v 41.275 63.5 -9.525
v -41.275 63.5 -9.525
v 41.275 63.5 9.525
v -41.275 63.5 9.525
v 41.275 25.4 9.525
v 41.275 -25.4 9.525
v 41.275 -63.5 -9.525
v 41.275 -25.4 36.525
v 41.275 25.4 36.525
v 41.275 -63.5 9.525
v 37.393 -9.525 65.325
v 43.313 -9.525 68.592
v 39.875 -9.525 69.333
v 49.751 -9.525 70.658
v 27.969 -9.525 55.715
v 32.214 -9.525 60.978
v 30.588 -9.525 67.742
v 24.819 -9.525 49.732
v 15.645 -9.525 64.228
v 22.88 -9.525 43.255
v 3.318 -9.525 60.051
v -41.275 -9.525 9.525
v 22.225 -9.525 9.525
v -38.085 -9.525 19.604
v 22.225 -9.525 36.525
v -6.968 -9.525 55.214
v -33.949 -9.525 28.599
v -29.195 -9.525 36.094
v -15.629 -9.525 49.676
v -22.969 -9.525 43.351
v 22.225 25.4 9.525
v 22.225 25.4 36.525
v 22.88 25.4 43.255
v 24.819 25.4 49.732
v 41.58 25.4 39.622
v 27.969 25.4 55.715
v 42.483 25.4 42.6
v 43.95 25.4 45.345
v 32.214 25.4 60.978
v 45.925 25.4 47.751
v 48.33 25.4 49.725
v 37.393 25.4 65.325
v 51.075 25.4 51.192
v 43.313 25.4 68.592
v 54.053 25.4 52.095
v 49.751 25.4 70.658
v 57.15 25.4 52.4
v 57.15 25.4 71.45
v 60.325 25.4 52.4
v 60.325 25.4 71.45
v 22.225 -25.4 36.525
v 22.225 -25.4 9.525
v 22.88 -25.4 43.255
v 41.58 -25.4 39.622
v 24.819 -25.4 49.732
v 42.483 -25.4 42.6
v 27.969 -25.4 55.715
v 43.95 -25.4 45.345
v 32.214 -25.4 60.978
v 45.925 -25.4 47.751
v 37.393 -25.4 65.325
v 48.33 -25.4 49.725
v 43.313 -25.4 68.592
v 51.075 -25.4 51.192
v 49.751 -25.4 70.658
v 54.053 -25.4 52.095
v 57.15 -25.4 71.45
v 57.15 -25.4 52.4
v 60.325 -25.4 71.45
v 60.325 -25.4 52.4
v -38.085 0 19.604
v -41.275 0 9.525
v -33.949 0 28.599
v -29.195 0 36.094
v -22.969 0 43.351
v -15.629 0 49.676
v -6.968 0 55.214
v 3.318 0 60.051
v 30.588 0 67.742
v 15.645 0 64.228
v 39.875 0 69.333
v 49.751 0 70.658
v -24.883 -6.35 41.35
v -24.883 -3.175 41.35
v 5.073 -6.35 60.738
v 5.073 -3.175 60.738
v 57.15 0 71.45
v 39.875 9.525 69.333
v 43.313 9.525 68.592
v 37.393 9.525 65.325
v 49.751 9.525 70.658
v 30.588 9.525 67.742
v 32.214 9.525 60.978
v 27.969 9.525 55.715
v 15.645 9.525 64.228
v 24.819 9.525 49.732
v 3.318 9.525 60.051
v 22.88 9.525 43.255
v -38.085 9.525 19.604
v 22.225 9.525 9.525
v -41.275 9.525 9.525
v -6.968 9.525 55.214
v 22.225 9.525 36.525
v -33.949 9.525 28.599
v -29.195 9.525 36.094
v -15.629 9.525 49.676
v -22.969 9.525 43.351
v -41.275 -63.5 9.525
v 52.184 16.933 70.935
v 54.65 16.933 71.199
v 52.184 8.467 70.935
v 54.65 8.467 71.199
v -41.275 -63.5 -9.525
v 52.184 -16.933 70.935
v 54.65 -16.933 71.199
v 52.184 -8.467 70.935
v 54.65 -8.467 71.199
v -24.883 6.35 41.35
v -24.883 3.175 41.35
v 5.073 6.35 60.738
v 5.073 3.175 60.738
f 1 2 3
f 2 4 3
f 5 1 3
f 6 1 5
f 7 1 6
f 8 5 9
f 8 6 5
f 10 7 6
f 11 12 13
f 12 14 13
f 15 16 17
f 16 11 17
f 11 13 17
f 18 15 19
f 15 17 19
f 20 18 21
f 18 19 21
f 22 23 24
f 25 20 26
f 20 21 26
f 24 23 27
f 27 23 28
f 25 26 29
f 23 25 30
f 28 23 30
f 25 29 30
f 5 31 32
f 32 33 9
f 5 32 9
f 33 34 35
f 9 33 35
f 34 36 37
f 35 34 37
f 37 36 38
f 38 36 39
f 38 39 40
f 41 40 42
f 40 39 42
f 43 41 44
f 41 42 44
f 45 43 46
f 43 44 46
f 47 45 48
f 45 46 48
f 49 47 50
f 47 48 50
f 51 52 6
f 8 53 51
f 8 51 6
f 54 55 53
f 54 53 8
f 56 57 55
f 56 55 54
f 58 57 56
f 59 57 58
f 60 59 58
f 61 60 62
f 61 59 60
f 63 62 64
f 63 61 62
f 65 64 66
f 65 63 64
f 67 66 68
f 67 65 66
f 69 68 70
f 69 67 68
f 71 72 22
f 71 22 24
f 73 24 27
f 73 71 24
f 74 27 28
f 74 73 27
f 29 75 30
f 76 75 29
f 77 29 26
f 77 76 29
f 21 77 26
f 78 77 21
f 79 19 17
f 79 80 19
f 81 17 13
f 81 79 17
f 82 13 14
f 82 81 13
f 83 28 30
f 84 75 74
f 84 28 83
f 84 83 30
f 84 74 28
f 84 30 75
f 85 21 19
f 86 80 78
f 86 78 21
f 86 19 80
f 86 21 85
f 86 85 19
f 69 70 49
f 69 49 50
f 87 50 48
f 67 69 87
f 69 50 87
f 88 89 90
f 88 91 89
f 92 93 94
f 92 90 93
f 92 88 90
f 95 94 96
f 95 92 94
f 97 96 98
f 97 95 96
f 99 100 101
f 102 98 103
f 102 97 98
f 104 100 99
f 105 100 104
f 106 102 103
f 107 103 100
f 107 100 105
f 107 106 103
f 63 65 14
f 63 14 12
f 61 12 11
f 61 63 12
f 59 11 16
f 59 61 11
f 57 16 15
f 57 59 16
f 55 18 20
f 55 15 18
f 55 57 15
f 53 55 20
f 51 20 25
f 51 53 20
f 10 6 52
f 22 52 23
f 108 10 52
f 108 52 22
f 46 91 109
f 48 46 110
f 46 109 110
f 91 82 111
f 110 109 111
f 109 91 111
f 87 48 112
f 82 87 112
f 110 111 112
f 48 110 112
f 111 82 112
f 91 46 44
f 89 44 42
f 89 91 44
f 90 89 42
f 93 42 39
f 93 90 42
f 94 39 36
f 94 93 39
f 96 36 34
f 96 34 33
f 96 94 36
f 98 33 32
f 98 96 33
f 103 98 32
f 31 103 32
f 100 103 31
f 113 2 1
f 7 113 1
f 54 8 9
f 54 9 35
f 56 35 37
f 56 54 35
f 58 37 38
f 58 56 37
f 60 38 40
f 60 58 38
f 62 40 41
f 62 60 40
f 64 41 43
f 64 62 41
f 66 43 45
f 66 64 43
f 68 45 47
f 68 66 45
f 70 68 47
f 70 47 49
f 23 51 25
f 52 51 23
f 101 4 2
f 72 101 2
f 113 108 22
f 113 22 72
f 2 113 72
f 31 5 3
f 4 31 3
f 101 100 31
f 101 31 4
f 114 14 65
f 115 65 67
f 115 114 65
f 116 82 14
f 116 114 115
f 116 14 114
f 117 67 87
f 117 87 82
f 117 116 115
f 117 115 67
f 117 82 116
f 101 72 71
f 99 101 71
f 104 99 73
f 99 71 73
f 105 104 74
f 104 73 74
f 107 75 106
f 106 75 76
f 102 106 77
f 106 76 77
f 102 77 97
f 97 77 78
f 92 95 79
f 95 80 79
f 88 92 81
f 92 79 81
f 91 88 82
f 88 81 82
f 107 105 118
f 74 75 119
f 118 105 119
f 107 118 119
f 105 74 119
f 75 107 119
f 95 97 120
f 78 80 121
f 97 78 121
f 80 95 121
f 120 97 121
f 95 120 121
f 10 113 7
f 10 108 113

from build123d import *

# Parameters (mm, degrees)
F1_DEPTH = 63.5
F2_DEPTH = 25.4
F3_DEPTH = 9.525


with BuildPart() as f1:
    # F0 (on Front) → F1 (new body, symmetric)
    with BuildSketch(Plane.XZ):
        Polygon((-41.275, -9.525), (41.275, -9.525), (41.275, 9.525), (22.225, 9.525), (-41.275, 9.525), align=None)
    extrude(amount=F1_DEPTH, both=True)

    # F0 (on Front) → F2 (join, symmetric)
    with BuildSketch(Plane.XZ):
        with BuildLine():
            Line((22.225, 9.525), (41.275, 9.525))
            Line((41.275, 9.525), (41.275, 36.5252))
            ThreePointArc((41.275, 36.5252), (45.92468, 47.75052), (57.15, 52.4002))
            Line((57.15, 52.4002), (60.325, 52.4002))
            Line((60.325, 52.4002), (60.325, 71.4502))
            Line((60.325, 71.4502), (57.15, 71.4502))
            add(Edge.make_bspline(
                [(49.751271, 70.657508), (52.166771, 70.942003), (54.632844, 71.205798), (57.15, 71.4502)],
                knots=[111.1633, 111.1633, 111.1633, 111.1633, 116.285042, 116.285042, 116.285042, 116.285042], degree=3))
            ThreePointArc((49.751271, 70.657508), (29.964009, 58.449559), (22.225, 36.5252))
            Line((22.225, 36.5252), (22.225, 9.525))
        make_face()
    extrude(amount=F2_DEPTH, both=True)

    # F0 (on Front) → F3 (join, symmetric)
    with BuildSketch(Plane.XZ):
        with BuildLine():
            add(Edge.make_bspline(
                [(-41.275, 9.525), (-31.278197, 48.557062), (-2.675208, 64.482776), (49.751271, 70.657508)],
                knots=[0, 0, 0, 0, 111.1633, 111.1633, 111.1633, 111.1633], degree=3))
            Line((-41.275, 9.525), (22.225, 9.525))
            Line((22.225, 9.525), (22.225, 36.5252))
            ThreePointArc((22.225, 36.5252), (29.964009, 58.449559), (49.751271, 70.657508))
        make_face()
    extrude(amount=F3_DEPTH, both=True)


solid = f1.part
